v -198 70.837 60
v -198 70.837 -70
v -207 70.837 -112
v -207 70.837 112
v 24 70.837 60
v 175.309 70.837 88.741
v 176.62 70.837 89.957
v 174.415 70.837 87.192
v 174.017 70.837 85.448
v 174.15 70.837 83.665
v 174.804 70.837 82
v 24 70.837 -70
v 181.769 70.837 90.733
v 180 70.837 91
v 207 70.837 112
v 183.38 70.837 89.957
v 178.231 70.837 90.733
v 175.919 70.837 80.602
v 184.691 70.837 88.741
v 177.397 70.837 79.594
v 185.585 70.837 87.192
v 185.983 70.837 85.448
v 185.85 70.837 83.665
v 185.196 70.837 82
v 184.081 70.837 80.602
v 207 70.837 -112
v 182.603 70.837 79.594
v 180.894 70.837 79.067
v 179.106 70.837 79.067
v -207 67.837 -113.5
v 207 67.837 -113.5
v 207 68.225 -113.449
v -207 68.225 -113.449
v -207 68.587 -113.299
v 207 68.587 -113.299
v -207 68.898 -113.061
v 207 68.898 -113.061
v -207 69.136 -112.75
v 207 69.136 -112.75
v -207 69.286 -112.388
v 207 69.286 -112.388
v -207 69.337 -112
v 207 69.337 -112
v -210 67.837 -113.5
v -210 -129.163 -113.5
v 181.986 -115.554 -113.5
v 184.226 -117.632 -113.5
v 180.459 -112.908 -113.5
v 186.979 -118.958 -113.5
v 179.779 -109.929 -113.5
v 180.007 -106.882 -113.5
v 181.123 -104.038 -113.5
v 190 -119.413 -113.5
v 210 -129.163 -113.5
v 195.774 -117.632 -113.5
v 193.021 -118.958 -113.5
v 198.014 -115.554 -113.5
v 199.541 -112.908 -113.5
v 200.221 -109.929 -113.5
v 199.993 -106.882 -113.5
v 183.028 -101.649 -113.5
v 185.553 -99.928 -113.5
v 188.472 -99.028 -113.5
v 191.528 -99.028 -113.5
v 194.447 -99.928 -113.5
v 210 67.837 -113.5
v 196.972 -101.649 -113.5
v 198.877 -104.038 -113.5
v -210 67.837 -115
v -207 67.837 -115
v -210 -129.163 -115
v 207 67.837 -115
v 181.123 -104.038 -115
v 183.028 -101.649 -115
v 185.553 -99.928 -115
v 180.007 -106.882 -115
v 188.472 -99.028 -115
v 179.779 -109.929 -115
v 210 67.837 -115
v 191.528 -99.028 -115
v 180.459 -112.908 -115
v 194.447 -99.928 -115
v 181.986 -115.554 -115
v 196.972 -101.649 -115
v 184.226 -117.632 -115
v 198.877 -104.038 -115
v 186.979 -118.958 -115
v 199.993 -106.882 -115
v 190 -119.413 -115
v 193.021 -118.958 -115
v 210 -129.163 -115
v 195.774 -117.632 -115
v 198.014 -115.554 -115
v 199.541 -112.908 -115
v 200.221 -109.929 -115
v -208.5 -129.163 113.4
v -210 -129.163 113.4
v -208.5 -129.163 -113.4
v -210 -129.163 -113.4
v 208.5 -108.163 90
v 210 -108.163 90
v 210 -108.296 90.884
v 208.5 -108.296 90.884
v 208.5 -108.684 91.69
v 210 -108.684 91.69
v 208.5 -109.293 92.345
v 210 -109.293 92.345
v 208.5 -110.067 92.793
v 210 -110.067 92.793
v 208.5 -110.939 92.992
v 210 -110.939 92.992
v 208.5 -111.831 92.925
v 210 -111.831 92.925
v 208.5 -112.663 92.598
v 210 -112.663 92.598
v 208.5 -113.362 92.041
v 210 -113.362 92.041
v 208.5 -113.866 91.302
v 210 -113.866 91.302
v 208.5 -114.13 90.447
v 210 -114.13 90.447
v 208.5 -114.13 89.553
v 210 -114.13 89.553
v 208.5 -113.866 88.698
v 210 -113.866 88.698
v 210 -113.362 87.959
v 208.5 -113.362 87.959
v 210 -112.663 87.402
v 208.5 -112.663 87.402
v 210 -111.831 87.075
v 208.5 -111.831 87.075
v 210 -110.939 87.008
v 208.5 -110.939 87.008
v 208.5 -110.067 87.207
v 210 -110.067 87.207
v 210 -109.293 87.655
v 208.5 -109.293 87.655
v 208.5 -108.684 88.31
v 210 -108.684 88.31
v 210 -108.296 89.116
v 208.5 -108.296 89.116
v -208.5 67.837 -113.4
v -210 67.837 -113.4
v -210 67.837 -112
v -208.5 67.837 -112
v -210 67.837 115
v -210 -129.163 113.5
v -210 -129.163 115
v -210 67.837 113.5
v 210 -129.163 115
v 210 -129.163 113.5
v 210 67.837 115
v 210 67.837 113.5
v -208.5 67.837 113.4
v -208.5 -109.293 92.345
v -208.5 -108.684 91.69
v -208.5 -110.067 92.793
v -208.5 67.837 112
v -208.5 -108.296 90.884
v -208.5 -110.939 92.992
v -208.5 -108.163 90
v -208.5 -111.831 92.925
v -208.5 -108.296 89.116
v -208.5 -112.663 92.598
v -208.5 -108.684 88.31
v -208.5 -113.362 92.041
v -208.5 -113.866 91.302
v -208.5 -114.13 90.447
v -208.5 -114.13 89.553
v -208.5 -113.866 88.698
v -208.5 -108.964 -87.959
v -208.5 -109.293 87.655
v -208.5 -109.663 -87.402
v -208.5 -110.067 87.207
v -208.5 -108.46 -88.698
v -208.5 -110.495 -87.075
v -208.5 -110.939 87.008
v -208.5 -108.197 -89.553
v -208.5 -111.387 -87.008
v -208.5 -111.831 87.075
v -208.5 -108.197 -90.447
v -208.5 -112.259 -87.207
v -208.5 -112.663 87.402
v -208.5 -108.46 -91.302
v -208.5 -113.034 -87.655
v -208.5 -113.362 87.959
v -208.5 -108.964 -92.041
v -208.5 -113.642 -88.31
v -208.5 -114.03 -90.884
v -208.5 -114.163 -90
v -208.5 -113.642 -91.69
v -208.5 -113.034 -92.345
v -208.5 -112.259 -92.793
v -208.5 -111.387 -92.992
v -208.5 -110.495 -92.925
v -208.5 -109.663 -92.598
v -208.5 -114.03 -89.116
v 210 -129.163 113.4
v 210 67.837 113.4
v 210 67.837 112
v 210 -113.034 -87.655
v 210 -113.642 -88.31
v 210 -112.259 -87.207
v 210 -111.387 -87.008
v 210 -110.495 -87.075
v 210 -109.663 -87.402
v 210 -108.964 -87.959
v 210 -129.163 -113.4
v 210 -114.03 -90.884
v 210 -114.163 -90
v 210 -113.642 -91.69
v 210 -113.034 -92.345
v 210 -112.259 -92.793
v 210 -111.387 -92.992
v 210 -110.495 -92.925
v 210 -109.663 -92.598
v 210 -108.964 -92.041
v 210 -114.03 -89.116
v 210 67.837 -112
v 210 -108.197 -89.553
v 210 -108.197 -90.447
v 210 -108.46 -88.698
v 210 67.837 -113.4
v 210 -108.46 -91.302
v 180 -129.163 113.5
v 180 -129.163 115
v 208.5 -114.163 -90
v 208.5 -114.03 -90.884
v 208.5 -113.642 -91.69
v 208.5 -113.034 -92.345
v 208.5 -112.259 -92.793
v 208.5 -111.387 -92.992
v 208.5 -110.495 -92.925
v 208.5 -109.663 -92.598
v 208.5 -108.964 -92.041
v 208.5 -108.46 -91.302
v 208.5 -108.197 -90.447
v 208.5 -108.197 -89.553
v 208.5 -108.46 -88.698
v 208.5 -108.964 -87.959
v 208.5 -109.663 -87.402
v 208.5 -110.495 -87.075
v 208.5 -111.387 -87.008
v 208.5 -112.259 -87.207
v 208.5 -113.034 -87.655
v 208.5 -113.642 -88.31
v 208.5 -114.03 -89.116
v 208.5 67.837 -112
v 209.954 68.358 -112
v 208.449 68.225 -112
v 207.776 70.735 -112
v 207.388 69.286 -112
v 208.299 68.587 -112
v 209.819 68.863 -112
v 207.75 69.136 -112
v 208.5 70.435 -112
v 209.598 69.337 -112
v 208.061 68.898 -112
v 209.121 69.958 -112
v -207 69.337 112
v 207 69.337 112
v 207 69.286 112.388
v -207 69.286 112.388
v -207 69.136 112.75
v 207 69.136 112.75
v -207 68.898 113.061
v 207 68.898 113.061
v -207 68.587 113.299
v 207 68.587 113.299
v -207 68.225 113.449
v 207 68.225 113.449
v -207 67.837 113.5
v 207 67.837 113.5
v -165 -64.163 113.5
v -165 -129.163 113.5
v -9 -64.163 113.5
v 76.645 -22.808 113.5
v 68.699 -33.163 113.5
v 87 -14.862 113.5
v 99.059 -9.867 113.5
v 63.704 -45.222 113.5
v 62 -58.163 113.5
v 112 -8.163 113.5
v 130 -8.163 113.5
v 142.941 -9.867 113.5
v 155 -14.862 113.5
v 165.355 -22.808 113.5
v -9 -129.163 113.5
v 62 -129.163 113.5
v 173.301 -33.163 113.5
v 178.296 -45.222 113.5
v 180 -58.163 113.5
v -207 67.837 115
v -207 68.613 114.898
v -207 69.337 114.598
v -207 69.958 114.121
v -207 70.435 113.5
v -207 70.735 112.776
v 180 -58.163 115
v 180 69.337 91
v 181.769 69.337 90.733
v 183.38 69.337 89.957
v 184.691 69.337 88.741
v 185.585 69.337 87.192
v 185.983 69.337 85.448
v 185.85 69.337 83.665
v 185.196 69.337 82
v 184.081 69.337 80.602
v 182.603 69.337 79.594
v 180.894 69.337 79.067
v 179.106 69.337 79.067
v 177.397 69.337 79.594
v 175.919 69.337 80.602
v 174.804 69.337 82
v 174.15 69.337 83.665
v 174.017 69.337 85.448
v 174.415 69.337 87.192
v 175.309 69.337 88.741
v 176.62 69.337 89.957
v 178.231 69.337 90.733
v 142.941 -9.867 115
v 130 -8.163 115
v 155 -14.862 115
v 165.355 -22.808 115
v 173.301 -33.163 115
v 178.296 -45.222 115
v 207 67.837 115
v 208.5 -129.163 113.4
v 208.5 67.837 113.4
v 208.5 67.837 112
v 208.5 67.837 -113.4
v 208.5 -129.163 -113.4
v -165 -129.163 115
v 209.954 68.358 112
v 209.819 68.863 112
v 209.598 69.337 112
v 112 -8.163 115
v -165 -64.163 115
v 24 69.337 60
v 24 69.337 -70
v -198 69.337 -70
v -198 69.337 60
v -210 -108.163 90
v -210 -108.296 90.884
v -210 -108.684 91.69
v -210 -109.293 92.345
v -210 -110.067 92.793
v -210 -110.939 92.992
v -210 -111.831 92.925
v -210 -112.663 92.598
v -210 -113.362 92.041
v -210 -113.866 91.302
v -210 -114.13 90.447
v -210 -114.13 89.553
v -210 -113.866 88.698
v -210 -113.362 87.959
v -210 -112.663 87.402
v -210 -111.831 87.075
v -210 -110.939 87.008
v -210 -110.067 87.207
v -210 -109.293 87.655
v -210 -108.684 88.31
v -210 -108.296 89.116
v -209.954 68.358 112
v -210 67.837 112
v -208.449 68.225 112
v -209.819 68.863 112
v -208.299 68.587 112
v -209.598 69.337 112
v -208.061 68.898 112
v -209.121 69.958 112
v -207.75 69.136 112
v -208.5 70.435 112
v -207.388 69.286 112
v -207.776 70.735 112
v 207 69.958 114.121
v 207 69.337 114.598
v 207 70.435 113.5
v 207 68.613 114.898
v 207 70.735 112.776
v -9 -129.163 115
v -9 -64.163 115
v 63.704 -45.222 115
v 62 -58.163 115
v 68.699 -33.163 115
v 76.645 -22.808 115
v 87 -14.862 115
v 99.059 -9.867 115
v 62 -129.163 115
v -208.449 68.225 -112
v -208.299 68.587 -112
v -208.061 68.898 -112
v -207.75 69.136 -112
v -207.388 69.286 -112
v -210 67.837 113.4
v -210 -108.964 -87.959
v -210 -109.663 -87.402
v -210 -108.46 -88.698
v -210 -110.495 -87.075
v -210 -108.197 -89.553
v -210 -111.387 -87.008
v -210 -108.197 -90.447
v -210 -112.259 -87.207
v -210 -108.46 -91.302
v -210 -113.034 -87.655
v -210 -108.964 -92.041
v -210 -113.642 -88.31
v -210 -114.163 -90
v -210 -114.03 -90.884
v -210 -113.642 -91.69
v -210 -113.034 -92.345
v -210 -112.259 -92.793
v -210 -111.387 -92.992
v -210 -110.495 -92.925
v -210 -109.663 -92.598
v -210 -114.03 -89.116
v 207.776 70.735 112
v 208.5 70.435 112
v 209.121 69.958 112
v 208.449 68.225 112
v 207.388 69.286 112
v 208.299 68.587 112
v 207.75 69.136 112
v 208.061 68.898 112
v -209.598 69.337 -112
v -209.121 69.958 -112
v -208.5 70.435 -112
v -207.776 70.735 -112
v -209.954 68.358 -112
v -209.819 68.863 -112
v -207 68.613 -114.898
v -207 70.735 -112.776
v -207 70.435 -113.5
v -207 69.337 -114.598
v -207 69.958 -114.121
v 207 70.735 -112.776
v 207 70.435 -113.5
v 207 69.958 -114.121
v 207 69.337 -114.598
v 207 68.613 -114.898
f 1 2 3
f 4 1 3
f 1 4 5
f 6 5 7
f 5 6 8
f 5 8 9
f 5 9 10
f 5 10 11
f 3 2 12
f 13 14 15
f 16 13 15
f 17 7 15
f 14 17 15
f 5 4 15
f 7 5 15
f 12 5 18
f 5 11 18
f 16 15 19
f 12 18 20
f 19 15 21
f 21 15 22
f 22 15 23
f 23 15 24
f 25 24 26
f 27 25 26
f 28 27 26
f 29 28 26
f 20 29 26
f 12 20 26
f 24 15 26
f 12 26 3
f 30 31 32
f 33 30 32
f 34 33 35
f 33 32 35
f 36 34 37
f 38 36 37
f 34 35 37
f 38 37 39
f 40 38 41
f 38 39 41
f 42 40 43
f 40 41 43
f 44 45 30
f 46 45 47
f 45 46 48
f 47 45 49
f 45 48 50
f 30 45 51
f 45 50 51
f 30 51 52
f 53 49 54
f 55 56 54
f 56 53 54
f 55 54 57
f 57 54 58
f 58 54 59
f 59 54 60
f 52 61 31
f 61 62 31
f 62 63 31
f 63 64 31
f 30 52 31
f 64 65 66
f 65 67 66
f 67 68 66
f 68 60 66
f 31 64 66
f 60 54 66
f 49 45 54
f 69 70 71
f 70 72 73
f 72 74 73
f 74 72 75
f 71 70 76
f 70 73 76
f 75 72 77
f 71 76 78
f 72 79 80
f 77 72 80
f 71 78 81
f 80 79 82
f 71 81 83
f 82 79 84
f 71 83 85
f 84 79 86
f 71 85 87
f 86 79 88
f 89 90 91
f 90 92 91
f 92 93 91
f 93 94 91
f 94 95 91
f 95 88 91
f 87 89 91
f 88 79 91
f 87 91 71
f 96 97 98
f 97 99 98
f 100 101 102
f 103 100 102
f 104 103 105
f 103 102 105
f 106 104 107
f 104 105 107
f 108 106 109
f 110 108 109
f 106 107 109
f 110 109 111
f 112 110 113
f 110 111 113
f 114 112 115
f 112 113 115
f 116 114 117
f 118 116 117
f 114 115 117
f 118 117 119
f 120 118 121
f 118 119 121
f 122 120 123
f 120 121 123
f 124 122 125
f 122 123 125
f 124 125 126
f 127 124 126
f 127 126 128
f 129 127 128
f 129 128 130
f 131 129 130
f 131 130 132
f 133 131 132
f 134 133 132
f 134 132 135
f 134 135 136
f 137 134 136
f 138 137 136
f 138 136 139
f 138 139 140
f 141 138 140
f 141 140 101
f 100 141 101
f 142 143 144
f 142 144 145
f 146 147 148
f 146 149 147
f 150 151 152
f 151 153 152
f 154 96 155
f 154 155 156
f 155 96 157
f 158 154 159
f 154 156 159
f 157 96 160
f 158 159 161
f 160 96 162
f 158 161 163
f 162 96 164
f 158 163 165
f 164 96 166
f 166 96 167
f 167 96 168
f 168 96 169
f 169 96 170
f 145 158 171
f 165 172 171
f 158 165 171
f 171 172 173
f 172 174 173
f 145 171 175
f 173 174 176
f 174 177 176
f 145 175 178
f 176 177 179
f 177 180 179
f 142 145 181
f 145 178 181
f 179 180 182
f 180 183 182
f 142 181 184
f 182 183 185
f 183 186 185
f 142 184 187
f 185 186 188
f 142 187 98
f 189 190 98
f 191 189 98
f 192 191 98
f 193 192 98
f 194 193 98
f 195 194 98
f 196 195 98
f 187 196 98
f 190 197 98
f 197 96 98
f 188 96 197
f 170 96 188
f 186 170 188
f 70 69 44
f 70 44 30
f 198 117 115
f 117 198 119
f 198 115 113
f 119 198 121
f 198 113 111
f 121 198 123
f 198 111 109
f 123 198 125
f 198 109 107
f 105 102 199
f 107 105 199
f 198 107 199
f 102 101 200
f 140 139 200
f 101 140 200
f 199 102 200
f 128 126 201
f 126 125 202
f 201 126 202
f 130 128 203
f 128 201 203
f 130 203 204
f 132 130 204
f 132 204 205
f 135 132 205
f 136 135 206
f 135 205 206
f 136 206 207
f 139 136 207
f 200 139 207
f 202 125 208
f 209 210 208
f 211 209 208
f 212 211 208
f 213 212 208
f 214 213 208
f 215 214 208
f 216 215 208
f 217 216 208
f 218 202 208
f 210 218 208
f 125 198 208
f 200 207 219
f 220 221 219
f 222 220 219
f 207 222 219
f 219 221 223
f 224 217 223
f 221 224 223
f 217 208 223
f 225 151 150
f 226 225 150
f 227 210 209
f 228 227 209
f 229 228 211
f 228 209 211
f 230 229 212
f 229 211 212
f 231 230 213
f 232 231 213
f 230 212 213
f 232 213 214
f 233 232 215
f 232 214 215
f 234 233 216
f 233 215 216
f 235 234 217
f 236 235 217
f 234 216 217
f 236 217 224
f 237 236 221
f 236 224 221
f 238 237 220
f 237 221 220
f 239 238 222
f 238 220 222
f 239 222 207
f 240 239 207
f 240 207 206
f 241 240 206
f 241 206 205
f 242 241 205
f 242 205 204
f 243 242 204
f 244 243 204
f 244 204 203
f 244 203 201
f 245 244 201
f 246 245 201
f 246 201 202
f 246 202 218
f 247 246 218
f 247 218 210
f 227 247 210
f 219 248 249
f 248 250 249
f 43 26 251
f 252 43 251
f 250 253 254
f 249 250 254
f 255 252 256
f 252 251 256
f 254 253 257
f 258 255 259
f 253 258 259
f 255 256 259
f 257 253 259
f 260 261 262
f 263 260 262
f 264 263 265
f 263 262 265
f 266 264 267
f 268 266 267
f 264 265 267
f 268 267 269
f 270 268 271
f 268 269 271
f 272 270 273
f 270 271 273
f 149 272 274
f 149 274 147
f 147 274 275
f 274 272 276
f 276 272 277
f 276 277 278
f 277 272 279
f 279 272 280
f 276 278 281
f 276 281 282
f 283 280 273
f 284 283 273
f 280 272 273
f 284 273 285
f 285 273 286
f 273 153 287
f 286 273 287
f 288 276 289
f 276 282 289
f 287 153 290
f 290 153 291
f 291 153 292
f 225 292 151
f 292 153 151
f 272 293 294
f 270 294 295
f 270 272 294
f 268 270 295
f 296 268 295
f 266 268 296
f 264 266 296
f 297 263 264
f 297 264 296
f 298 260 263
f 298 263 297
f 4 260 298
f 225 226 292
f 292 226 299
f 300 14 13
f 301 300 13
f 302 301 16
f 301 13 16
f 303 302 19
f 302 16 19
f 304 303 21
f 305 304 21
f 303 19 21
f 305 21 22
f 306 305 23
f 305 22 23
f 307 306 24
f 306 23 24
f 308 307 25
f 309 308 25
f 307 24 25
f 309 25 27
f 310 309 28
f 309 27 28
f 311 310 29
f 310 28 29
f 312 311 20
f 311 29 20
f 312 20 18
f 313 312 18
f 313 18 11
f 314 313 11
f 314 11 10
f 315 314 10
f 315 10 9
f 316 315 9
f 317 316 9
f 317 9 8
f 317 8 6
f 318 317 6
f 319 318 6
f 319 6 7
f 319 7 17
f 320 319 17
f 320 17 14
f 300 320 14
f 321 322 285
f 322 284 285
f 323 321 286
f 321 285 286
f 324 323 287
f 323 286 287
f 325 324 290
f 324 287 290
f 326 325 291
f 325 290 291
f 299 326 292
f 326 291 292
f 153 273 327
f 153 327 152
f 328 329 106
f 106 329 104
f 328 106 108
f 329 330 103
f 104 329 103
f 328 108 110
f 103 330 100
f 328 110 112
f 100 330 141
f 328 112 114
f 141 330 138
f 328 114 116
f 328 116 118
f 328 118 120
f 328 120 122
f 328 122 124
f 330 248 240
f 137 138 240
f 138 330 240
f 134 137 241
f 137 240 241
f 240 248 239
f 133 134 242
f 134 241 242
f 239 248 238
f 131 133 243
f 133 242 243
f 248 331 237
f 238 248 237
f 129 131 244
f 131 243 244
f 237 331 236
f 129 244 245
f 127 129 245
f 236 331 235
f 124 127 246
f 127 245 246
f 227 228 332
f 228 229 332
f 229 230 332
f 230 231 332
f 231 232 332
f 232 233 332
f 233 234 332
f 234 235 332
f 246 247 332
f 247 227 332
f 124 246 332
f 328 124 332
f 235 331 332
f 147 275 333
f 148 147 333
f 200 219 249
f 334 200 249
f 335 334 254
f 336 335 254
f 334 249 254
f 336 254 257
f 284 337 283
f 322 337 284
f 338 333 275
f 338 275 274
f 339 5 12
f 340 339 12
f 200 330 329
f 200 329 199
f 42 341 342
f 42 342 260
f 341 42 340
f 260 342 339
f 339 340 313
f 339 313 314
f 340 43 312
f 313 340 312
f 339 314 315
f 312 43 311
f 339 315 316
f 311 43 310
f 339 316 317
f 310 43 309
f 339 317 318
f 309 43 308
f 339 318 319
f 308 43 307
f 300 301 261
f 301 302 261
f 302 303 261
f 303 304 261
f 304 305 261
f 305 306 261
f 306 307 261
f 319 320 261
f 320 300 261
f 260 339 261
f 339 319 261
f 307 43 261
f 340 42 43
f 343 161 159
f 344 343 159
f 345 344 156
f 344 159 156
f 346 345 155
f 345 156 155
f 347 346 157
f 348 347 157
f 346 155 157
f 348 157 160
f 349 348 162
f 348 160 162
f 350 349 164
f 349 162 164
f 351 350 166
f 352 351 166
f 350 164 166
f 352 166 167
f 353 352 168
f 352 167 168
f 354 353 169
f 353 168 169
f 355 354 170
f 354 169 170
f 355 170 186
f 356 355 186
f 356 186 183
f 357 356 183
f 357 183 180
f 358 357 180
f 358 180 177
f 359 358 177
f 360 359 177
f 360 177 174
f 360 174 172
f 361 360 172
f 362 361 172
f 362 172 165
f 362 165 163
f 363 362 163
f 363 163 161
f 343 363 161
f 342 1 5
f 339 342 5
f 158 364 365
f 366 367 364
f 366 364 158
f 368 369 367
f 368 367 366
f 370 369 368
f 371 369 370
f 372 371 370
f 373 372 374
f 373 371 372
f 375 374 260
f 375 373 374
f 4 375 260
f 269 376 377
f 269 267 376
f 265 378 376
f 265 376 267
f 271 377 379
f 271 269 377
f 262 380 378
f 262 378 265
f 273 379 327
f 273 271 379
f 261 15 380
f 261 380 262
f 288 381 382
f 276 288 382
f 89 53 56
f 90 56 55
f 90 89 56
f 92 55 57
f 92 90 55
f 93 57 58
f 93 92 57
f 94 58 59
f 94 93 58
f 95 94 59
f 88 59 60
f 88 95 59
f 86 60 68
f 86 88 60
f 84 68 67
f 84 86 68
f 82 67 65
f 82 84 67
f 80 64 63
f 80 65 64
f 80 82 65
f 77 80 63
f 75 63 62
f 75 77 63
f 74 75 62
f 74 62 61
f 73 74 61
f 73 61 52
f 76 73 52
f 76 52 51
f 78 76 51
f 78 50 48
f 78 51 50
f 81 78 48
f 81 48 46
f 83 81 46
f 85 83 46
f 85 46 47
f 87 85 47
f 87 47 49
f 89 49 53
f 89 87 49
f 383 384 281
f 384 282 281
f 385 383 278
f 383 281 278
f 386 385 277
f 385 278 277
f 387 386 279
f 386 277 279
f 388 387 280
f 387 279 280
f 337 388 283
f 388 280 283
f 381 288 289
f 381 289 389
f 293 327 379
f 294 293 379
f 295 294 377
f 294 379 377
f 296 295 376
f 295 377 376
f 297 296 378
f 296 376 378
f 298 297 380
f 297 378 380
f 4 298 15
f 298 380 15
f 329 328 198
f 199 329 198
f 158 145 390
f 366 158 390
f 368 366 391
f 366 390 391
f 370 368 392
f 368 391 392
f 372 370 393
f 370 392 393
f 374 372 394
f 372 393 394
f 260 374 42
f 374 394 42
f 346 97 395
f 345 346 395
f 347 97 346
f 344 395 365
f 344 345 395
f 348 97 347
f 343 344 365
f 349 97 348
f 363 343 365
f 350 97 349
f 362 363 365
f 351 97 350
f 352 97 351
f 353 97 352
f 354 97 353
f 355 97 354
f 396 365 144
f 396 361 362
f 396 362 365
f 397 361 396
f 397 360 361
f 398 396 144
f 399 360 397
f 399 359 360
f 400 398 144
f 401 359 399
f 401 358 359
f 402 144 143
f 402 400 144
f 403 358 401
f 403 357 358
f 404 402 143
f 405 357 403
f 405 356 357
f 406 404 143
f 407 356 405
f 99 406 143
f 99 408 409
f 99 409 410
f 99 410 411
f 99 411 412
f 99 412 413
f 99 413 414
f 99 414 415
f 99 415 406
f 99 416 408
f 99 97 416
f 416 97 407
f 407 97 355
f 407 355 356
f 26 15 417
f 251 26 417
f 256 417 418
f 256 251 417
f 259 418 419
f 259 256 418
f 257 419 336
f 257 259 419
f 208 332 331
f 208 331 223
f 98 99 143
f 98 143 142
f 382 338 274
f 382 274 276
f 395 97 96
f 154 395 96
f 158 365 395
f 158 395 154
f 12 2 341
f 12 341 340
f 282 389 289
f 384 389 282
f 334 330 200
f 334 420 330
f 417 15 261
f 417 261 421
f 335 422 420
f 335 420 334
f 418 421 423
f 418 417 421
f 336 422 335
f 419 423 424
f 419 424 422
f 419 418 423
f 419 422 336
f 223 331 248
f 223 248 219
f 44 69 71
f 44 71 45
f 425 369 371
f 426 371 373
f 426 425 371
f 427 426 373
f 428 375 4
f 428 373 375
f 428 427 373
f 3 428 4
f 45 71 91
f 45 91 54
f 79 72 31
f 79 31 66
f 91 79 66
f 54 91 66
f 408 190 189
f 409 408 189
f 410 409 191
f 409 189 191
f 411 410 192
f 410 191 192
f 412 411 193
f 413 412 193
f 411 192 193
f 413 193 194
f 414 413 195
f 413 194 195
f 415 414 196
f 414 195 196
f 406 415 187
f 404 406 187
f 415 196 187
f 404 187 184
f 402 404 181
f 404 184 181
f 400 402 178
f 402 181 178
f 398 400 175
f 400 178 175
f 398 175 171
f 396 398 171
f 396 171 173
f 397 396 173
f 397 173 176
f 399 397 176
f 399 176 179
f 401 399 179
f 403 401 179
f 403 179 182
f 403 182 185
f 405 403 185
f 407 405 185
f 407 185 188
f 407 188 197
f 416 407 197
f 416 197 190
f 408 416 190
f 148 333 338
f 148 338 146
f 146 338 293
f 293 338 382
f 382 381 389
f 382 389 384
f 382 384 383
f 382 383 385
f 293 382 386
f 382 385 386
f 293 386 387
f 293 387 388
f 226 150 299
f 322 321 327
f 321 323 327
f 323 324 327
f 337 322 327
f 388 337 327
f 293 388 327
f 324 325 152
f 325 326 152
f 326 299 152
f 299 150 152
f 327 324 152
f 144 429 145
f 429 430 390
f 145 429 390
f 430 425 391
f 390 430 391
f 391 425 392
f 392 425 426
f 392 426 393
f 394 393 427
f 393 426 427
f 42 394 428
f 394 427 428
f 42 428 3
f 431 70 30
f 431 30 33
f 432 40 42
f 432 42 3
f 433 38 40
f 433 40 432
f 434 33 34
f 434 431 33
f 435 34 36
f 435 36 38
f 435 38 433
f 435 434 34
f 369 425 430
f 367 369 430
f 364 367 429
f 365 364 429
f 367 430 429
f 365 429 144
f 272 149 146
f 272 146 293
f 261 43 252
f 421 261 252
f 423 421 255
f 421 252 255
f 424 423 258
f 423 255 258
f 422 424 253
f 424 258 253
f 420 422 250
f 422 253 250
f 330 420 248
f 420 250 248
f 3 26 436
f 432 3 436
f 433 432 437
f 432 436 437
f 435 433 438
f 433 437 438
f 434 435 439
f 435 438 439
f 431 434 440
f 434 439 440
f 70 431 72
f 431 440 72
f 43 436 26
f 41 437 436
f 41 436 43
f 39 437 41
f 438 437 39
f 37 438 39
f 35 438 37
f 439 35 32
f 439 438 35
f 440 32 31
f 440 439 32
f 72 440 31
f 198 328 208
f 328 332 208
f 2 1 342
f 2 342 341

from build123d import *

# Parameters (mm, degrees)
BASE_FLANGE2_DEPTH       = 210
SKETCH8_R                = 6
SKETCH8_W                = 222
SKETCH8_H                = 130
CUT_EXTRUDE1_DEPTH       = 10
SKETCH14_W               = 156
SKETCH14_H               = 65
SKETCH14_W_2             = 118
SKETCH14_H_2             = 121
CUT_EXTRUDE2_DEPTH       = 10
EDGE_FLANGE1_START       = -115
EDGE_FLANGE1_DEPTH       = 230
EDGE_FLANGE1_2_DEPTH     = 3
EDGE_FLANGE1_START_2     = 112
EDGE_FLANGE1_3_DEPTH     = 3
EDGE_FLANGE1_START_3     = -112
EDGE_FLANGE1_4_DEPTH     = 224
CLOSED_START             = -129.163047535
CLOSED_CORNER1_OUTLINE_W = 1.5
CLOSED_CORNER1_OUTLINE_H = 1.4
CLOSED_CORNER1_DEPTH     = 197
SKETCH35_R               = 10.25
CUT_EXTRUDE4_DEPTH       = 210
FILLET1_R                = 50
SKETCH37_R               = 3
CUT_EXTRUDE5_DEPTH       = 580


# Read off the part's stored shape, not the designer's step: Edge-Flange1, Closed Corner1
# Sheet-metal steps are written as plain solids
with BuildPart() as part:
    # Sketch5 → Base-Flange2 (new, symmetric)
    with BuildSketch(Plane(origin=(0, 0, 0), x_dir=(0, 0, -1), z_dir=(1, 0, 0))):
        with BuildLine():
            Line((-115, -129.163047535), (-115, 67.836952465))
            ThreePointArc((-115, 67.836952465), (-114.121320344, 69.958272808), (-112, 70.836952465))
            Line((-112, 70.836952465), (112, 70.836952465))
            ThreePointArc((112, 70.836952465), (114.121320344, 69.958272808), (115, 67.836952465))
            Line((115, 67.836952465), (115, -129.163047535))
            Line((115, -129.163047535), (113.5, -129.163047535))
            Line((113.5, -129.163047535), (113.5, 67.836952465))
            ThreePointArc((113.5, 67.836952465), (113.060660172, 68.897612636), (112, 69.336952465))
            Line((112, 69.336952465), (-112, 69.336952465))
            ThreePointArc((-112, 69.336952465), (-113.060660172, 68.897612636), (-113.5, 67.836952465))
            Line((-113.5, 67.836952465), (-113.5, -129.163047535))
            Line((-113.5, -129.163047535), (-115, -129.163047535))
        make_face()
    extrude(amount=BASE_FLANGE2_DEPTH, both=True)

    # Sketch8 → Cut-Extrude1 (cut)
    with BuildSketch(Plane(origin=(0, 70.836952465, 0), x_dir=(1, 0, 0), z_dir=(0, 1, 0))):
        with Locations(Location((180, -85, 0), (0, 0, 270))):
            Circle(SKETCH8_R)
        with Locations((-87, 5)):
            Rectangle(SKETCH8_W, SKETCH8_H)
    extrude(amount=-CUT_EXTRUDE1_DEPTH, mode=Mode.SUBTRACT)

    # Sketch14 → Cut-Extrude2 (cut)
    with BuildSketch(Plane.XY.offset(115)):
        with Locations((-87, -96.663047535)):
            Rectangle(SKETCH14_W, SKETCH14_H)
        with Locations((121, -68.663047535)):
            Rectangle(SKETCH14_W_2, SKETCH14_H_2)
    extrude(amount=-CUT_EXTRUDE2_DEPTH, mode=Mode.SUBTRACT)

    # Edge-Flange1 outline → Edge-Flange1 (cut)
    with BuildSketch(Plane.XY.offset(EDGE_FLANGE1_START)):
        with BuildLine():
            Line((210, 67.836952465), (210, 70.836952465))
            Line((210, 70.836952465), (207, 70.836952465))
            ThreePointArc((207, 70.836952465), (209.121320344, 69.958272808), (210, 67.836952465))
        make_face()
        with BuildLine():
            Line((207, 67.836952465), (208.5, 67.836952465))
            ThreePointArc((208.5, 67.836952465), (208.060660172, 68.897612636), (207, 69.336952465))
            Line((207, 69.336952465), (207, 67.836952465))
        make_face()
        with BuildLine():
            Line((-207, 67.836952465), (-207, 69.336952465))
            ThreePointArc((-207, 69.336952465), (-208.060660172, 68.897612636), (-208.5, 67.836952465))
            Line((-208.5, 67.836952465), (-207, 67.836952465))
        make_face()
        with BuildLine():
            Line((-207, 70.836952465), (-210, 70.836952465))
            Line((-210, 70.836952465), (-210, 67.836952465))
            ThreePointArc((-210, 67.836952465), (-209.121320344, 69.958272808), (-207, 70.836952465))
        make_face()
    extrude(amount=EDGE_FLANGE1_DEPTH, mode=Mode.SUBTRACT)

    # Edge-Flange1 2 outline → Edge-Flange1 2 (cut)
    with BuildSketch(Plane.XY.offset(EDGE_FLANGE1_START)):
        with BuildLine():
            Line((208.5, 67.836952465), (210, 67.836952465))
            ThreePointArc((210, 67.836952465), (209.121320344, 69.958272808), (207, 70.836952465))
            Line((207, 70.836952465), (207, 69.336952465))
            ThreePointArc((207, 69.336952465), (208.060660172, 68.897612636), (208.5, 67.836952465))
        make_face()
        with BuildLine():
            ThreePointArc((-207, 70.836952465), (-209.121320344, 69.958272808), (-210, 67.836952465))
            Line((-210, 67.836952465), (-208.5, 67.836952465))
            ThreePointArc((-208.5, 67.836952465), (-208.060660172, 68.897612636), (-207, 69.336952465))
            Line((-207, 69.336952465), (-207, 70.836952465))
        make_face()
    extrude(amount=EDGE_FLANGE1_2_DEPTH, mode=Mode.SUBTRACT)

    # Edge-Flange1 3 outline → Edge-Flange1 3 (cut)
    with BuildSketch(Plane.XY.offset(EDGE_FLANGE1_START_2)):
        with BuildLine():
            Line((208.5, 67.836952465), (210, 67.836952465))
            ThreePointArc((210, 67.836952465), (209.121320344, 69.958272808), (207, 70.836952465))
            Line((207, 70.836952465), (207, 69.336952465))
            ThreePointArc((207, 69.336952465), (208.060660172, 68.897612636), (208.5, 67.836952465))
        make_face()
        with BuildLine():
            ThreePointArc((-207, 70.836952465), (-209.121320344, 69.958272808), (-210, 67.836952465))
            Line((-210, 67.836952465), (-208.5, 67.836952465))
            ThreePointArc((-208.5, 67.836952465), (-208.060660172, 68.897612636), (-207, 69.336952465))
            Line((-207, 69.336952465), (-207, 70.836952465))
        make_face()
    extrude(amount=EDGE_FLANGE1_3_DEPTH, mode=Mode.SUBTRACT)

    # Edge-Flange1 4 outline → Edge-Flange1 4 (add)
    with BuildSketch(Plane.XY.offset(EDGE_FLANGE1_START_3)):
        with BuildLine():
            Line((210, -129.163047535), (210, 67.836952465))
            ThreePointArc((210, 67.836952465), (209.897777479, 68.6134096), (209.598076211, 69.336952465))
            Line((209.598076211, 69.336952465), (207, 69.336952465))
            ThreePointArc((207, 69.336952465), (208.060660172, 68.897612636), (208.5, 67.836952465))
            Line((208.5, 67.836952465), (208.5, -129.163047535))
            Line((208.5, -129.163047535), (210, -129.163047535))
        make_face()
        with BuildLine():
            ThreePointArc((-208.5, 67.836952465), (-208.060660172, 68.897612636), (-207, 69.336952465))
            Line((-207, 69.336952465), (-209.598076211, 69.336952465))
            ThreePointArc((-209.598076211, 69.336952465), (-209.897777479, 68.6134096), (-210, 67.836952465))
            Line((-210, 67.836952465), (-210, -129.163047535))
            Line((-210, -129.163047535), (-208.5, -129.163047535))
            Line((-208.5, -129.163047535), (-208.5, 67.836952465))
        make_face()
    extrude(amount=EDGE_FLANGE1_4_DEPTH)

    # Closed Corner1 outline → Closed Corner1 (add)
    with BuildSketch(Plane(origin=(0, 0, 0), x_dir=(1, 0, 0), z_dir=(0, 1, 0)).offset(CLOSED_START)):
        with Locations((-209.25, -112.7)):
            Rectangle(CLOSED_CORNER1_OUTLINE_W, CLOSED_CORNER1_OUTLINE_H)
        with Locations((-209.25, 112.7)):
            Rectangle(CLOSED_CORNER1_OUTLINE_W, CLOSED_CORNER1_OUTLINE_H)
        with Locations((209.25, -112.7)):
            Rectangle(CLOSED_CORNER1_OUTLINE_W, CLOSED_CORNER1_OUTLINE_H)
        with Locations((209.25, 112.7)):
            Rectangle(CLOSED_CORNER1_OUTLINE_W, CLOSED_CORNER1_OUTLINE_H)
    extrude(amount=CLOSED_CORNER1_DEPTH)

    # Sketch35 → Cut-Extrude4 (cut)
    with BuildSketch(Plane(origin=(95, 0, -115), x_dir=(1, 0, 0), z_dir=(0, 0, 1))):
        with Locations(Location((95, -109.163047535, 0), (0, 0, 270))):
            Circle(SKETCH35_R)
    extrude(amount=CUT_EXTRUDE4_DEPTH, mode=Mode.SUBTRACT)

    # Fillet1
    fillet1_edges = [part.edges().sort_by_distance(p)[0] for p in [
        (180, -8.163047535, 114.25),
        (62, -8.163047535, 114.25),
    ]]
    fillet(fillet1_edges, radius=FILLET1_R)

    # Sketch37 → Cut-Extrude5 (cut)
    with BuildSketch(Plane(origin=(210, 0, 0), x_dir=(0, 0, -1), z_dir=(1, 0, 0))):
        with Locations(Location((-90, -111.163047535, 0), (0, 0, 90))):
            Circle(SKETCH37_R)
        with Locations(Location((90, -111.163047535, 0), (0, 0, 270))):
            Circle(SKETCH37_R)
    extrude(amount=-CUT_EXTRUDE5_DEPTH, mode=Mode.SUBTRACT)


solid = part.part
